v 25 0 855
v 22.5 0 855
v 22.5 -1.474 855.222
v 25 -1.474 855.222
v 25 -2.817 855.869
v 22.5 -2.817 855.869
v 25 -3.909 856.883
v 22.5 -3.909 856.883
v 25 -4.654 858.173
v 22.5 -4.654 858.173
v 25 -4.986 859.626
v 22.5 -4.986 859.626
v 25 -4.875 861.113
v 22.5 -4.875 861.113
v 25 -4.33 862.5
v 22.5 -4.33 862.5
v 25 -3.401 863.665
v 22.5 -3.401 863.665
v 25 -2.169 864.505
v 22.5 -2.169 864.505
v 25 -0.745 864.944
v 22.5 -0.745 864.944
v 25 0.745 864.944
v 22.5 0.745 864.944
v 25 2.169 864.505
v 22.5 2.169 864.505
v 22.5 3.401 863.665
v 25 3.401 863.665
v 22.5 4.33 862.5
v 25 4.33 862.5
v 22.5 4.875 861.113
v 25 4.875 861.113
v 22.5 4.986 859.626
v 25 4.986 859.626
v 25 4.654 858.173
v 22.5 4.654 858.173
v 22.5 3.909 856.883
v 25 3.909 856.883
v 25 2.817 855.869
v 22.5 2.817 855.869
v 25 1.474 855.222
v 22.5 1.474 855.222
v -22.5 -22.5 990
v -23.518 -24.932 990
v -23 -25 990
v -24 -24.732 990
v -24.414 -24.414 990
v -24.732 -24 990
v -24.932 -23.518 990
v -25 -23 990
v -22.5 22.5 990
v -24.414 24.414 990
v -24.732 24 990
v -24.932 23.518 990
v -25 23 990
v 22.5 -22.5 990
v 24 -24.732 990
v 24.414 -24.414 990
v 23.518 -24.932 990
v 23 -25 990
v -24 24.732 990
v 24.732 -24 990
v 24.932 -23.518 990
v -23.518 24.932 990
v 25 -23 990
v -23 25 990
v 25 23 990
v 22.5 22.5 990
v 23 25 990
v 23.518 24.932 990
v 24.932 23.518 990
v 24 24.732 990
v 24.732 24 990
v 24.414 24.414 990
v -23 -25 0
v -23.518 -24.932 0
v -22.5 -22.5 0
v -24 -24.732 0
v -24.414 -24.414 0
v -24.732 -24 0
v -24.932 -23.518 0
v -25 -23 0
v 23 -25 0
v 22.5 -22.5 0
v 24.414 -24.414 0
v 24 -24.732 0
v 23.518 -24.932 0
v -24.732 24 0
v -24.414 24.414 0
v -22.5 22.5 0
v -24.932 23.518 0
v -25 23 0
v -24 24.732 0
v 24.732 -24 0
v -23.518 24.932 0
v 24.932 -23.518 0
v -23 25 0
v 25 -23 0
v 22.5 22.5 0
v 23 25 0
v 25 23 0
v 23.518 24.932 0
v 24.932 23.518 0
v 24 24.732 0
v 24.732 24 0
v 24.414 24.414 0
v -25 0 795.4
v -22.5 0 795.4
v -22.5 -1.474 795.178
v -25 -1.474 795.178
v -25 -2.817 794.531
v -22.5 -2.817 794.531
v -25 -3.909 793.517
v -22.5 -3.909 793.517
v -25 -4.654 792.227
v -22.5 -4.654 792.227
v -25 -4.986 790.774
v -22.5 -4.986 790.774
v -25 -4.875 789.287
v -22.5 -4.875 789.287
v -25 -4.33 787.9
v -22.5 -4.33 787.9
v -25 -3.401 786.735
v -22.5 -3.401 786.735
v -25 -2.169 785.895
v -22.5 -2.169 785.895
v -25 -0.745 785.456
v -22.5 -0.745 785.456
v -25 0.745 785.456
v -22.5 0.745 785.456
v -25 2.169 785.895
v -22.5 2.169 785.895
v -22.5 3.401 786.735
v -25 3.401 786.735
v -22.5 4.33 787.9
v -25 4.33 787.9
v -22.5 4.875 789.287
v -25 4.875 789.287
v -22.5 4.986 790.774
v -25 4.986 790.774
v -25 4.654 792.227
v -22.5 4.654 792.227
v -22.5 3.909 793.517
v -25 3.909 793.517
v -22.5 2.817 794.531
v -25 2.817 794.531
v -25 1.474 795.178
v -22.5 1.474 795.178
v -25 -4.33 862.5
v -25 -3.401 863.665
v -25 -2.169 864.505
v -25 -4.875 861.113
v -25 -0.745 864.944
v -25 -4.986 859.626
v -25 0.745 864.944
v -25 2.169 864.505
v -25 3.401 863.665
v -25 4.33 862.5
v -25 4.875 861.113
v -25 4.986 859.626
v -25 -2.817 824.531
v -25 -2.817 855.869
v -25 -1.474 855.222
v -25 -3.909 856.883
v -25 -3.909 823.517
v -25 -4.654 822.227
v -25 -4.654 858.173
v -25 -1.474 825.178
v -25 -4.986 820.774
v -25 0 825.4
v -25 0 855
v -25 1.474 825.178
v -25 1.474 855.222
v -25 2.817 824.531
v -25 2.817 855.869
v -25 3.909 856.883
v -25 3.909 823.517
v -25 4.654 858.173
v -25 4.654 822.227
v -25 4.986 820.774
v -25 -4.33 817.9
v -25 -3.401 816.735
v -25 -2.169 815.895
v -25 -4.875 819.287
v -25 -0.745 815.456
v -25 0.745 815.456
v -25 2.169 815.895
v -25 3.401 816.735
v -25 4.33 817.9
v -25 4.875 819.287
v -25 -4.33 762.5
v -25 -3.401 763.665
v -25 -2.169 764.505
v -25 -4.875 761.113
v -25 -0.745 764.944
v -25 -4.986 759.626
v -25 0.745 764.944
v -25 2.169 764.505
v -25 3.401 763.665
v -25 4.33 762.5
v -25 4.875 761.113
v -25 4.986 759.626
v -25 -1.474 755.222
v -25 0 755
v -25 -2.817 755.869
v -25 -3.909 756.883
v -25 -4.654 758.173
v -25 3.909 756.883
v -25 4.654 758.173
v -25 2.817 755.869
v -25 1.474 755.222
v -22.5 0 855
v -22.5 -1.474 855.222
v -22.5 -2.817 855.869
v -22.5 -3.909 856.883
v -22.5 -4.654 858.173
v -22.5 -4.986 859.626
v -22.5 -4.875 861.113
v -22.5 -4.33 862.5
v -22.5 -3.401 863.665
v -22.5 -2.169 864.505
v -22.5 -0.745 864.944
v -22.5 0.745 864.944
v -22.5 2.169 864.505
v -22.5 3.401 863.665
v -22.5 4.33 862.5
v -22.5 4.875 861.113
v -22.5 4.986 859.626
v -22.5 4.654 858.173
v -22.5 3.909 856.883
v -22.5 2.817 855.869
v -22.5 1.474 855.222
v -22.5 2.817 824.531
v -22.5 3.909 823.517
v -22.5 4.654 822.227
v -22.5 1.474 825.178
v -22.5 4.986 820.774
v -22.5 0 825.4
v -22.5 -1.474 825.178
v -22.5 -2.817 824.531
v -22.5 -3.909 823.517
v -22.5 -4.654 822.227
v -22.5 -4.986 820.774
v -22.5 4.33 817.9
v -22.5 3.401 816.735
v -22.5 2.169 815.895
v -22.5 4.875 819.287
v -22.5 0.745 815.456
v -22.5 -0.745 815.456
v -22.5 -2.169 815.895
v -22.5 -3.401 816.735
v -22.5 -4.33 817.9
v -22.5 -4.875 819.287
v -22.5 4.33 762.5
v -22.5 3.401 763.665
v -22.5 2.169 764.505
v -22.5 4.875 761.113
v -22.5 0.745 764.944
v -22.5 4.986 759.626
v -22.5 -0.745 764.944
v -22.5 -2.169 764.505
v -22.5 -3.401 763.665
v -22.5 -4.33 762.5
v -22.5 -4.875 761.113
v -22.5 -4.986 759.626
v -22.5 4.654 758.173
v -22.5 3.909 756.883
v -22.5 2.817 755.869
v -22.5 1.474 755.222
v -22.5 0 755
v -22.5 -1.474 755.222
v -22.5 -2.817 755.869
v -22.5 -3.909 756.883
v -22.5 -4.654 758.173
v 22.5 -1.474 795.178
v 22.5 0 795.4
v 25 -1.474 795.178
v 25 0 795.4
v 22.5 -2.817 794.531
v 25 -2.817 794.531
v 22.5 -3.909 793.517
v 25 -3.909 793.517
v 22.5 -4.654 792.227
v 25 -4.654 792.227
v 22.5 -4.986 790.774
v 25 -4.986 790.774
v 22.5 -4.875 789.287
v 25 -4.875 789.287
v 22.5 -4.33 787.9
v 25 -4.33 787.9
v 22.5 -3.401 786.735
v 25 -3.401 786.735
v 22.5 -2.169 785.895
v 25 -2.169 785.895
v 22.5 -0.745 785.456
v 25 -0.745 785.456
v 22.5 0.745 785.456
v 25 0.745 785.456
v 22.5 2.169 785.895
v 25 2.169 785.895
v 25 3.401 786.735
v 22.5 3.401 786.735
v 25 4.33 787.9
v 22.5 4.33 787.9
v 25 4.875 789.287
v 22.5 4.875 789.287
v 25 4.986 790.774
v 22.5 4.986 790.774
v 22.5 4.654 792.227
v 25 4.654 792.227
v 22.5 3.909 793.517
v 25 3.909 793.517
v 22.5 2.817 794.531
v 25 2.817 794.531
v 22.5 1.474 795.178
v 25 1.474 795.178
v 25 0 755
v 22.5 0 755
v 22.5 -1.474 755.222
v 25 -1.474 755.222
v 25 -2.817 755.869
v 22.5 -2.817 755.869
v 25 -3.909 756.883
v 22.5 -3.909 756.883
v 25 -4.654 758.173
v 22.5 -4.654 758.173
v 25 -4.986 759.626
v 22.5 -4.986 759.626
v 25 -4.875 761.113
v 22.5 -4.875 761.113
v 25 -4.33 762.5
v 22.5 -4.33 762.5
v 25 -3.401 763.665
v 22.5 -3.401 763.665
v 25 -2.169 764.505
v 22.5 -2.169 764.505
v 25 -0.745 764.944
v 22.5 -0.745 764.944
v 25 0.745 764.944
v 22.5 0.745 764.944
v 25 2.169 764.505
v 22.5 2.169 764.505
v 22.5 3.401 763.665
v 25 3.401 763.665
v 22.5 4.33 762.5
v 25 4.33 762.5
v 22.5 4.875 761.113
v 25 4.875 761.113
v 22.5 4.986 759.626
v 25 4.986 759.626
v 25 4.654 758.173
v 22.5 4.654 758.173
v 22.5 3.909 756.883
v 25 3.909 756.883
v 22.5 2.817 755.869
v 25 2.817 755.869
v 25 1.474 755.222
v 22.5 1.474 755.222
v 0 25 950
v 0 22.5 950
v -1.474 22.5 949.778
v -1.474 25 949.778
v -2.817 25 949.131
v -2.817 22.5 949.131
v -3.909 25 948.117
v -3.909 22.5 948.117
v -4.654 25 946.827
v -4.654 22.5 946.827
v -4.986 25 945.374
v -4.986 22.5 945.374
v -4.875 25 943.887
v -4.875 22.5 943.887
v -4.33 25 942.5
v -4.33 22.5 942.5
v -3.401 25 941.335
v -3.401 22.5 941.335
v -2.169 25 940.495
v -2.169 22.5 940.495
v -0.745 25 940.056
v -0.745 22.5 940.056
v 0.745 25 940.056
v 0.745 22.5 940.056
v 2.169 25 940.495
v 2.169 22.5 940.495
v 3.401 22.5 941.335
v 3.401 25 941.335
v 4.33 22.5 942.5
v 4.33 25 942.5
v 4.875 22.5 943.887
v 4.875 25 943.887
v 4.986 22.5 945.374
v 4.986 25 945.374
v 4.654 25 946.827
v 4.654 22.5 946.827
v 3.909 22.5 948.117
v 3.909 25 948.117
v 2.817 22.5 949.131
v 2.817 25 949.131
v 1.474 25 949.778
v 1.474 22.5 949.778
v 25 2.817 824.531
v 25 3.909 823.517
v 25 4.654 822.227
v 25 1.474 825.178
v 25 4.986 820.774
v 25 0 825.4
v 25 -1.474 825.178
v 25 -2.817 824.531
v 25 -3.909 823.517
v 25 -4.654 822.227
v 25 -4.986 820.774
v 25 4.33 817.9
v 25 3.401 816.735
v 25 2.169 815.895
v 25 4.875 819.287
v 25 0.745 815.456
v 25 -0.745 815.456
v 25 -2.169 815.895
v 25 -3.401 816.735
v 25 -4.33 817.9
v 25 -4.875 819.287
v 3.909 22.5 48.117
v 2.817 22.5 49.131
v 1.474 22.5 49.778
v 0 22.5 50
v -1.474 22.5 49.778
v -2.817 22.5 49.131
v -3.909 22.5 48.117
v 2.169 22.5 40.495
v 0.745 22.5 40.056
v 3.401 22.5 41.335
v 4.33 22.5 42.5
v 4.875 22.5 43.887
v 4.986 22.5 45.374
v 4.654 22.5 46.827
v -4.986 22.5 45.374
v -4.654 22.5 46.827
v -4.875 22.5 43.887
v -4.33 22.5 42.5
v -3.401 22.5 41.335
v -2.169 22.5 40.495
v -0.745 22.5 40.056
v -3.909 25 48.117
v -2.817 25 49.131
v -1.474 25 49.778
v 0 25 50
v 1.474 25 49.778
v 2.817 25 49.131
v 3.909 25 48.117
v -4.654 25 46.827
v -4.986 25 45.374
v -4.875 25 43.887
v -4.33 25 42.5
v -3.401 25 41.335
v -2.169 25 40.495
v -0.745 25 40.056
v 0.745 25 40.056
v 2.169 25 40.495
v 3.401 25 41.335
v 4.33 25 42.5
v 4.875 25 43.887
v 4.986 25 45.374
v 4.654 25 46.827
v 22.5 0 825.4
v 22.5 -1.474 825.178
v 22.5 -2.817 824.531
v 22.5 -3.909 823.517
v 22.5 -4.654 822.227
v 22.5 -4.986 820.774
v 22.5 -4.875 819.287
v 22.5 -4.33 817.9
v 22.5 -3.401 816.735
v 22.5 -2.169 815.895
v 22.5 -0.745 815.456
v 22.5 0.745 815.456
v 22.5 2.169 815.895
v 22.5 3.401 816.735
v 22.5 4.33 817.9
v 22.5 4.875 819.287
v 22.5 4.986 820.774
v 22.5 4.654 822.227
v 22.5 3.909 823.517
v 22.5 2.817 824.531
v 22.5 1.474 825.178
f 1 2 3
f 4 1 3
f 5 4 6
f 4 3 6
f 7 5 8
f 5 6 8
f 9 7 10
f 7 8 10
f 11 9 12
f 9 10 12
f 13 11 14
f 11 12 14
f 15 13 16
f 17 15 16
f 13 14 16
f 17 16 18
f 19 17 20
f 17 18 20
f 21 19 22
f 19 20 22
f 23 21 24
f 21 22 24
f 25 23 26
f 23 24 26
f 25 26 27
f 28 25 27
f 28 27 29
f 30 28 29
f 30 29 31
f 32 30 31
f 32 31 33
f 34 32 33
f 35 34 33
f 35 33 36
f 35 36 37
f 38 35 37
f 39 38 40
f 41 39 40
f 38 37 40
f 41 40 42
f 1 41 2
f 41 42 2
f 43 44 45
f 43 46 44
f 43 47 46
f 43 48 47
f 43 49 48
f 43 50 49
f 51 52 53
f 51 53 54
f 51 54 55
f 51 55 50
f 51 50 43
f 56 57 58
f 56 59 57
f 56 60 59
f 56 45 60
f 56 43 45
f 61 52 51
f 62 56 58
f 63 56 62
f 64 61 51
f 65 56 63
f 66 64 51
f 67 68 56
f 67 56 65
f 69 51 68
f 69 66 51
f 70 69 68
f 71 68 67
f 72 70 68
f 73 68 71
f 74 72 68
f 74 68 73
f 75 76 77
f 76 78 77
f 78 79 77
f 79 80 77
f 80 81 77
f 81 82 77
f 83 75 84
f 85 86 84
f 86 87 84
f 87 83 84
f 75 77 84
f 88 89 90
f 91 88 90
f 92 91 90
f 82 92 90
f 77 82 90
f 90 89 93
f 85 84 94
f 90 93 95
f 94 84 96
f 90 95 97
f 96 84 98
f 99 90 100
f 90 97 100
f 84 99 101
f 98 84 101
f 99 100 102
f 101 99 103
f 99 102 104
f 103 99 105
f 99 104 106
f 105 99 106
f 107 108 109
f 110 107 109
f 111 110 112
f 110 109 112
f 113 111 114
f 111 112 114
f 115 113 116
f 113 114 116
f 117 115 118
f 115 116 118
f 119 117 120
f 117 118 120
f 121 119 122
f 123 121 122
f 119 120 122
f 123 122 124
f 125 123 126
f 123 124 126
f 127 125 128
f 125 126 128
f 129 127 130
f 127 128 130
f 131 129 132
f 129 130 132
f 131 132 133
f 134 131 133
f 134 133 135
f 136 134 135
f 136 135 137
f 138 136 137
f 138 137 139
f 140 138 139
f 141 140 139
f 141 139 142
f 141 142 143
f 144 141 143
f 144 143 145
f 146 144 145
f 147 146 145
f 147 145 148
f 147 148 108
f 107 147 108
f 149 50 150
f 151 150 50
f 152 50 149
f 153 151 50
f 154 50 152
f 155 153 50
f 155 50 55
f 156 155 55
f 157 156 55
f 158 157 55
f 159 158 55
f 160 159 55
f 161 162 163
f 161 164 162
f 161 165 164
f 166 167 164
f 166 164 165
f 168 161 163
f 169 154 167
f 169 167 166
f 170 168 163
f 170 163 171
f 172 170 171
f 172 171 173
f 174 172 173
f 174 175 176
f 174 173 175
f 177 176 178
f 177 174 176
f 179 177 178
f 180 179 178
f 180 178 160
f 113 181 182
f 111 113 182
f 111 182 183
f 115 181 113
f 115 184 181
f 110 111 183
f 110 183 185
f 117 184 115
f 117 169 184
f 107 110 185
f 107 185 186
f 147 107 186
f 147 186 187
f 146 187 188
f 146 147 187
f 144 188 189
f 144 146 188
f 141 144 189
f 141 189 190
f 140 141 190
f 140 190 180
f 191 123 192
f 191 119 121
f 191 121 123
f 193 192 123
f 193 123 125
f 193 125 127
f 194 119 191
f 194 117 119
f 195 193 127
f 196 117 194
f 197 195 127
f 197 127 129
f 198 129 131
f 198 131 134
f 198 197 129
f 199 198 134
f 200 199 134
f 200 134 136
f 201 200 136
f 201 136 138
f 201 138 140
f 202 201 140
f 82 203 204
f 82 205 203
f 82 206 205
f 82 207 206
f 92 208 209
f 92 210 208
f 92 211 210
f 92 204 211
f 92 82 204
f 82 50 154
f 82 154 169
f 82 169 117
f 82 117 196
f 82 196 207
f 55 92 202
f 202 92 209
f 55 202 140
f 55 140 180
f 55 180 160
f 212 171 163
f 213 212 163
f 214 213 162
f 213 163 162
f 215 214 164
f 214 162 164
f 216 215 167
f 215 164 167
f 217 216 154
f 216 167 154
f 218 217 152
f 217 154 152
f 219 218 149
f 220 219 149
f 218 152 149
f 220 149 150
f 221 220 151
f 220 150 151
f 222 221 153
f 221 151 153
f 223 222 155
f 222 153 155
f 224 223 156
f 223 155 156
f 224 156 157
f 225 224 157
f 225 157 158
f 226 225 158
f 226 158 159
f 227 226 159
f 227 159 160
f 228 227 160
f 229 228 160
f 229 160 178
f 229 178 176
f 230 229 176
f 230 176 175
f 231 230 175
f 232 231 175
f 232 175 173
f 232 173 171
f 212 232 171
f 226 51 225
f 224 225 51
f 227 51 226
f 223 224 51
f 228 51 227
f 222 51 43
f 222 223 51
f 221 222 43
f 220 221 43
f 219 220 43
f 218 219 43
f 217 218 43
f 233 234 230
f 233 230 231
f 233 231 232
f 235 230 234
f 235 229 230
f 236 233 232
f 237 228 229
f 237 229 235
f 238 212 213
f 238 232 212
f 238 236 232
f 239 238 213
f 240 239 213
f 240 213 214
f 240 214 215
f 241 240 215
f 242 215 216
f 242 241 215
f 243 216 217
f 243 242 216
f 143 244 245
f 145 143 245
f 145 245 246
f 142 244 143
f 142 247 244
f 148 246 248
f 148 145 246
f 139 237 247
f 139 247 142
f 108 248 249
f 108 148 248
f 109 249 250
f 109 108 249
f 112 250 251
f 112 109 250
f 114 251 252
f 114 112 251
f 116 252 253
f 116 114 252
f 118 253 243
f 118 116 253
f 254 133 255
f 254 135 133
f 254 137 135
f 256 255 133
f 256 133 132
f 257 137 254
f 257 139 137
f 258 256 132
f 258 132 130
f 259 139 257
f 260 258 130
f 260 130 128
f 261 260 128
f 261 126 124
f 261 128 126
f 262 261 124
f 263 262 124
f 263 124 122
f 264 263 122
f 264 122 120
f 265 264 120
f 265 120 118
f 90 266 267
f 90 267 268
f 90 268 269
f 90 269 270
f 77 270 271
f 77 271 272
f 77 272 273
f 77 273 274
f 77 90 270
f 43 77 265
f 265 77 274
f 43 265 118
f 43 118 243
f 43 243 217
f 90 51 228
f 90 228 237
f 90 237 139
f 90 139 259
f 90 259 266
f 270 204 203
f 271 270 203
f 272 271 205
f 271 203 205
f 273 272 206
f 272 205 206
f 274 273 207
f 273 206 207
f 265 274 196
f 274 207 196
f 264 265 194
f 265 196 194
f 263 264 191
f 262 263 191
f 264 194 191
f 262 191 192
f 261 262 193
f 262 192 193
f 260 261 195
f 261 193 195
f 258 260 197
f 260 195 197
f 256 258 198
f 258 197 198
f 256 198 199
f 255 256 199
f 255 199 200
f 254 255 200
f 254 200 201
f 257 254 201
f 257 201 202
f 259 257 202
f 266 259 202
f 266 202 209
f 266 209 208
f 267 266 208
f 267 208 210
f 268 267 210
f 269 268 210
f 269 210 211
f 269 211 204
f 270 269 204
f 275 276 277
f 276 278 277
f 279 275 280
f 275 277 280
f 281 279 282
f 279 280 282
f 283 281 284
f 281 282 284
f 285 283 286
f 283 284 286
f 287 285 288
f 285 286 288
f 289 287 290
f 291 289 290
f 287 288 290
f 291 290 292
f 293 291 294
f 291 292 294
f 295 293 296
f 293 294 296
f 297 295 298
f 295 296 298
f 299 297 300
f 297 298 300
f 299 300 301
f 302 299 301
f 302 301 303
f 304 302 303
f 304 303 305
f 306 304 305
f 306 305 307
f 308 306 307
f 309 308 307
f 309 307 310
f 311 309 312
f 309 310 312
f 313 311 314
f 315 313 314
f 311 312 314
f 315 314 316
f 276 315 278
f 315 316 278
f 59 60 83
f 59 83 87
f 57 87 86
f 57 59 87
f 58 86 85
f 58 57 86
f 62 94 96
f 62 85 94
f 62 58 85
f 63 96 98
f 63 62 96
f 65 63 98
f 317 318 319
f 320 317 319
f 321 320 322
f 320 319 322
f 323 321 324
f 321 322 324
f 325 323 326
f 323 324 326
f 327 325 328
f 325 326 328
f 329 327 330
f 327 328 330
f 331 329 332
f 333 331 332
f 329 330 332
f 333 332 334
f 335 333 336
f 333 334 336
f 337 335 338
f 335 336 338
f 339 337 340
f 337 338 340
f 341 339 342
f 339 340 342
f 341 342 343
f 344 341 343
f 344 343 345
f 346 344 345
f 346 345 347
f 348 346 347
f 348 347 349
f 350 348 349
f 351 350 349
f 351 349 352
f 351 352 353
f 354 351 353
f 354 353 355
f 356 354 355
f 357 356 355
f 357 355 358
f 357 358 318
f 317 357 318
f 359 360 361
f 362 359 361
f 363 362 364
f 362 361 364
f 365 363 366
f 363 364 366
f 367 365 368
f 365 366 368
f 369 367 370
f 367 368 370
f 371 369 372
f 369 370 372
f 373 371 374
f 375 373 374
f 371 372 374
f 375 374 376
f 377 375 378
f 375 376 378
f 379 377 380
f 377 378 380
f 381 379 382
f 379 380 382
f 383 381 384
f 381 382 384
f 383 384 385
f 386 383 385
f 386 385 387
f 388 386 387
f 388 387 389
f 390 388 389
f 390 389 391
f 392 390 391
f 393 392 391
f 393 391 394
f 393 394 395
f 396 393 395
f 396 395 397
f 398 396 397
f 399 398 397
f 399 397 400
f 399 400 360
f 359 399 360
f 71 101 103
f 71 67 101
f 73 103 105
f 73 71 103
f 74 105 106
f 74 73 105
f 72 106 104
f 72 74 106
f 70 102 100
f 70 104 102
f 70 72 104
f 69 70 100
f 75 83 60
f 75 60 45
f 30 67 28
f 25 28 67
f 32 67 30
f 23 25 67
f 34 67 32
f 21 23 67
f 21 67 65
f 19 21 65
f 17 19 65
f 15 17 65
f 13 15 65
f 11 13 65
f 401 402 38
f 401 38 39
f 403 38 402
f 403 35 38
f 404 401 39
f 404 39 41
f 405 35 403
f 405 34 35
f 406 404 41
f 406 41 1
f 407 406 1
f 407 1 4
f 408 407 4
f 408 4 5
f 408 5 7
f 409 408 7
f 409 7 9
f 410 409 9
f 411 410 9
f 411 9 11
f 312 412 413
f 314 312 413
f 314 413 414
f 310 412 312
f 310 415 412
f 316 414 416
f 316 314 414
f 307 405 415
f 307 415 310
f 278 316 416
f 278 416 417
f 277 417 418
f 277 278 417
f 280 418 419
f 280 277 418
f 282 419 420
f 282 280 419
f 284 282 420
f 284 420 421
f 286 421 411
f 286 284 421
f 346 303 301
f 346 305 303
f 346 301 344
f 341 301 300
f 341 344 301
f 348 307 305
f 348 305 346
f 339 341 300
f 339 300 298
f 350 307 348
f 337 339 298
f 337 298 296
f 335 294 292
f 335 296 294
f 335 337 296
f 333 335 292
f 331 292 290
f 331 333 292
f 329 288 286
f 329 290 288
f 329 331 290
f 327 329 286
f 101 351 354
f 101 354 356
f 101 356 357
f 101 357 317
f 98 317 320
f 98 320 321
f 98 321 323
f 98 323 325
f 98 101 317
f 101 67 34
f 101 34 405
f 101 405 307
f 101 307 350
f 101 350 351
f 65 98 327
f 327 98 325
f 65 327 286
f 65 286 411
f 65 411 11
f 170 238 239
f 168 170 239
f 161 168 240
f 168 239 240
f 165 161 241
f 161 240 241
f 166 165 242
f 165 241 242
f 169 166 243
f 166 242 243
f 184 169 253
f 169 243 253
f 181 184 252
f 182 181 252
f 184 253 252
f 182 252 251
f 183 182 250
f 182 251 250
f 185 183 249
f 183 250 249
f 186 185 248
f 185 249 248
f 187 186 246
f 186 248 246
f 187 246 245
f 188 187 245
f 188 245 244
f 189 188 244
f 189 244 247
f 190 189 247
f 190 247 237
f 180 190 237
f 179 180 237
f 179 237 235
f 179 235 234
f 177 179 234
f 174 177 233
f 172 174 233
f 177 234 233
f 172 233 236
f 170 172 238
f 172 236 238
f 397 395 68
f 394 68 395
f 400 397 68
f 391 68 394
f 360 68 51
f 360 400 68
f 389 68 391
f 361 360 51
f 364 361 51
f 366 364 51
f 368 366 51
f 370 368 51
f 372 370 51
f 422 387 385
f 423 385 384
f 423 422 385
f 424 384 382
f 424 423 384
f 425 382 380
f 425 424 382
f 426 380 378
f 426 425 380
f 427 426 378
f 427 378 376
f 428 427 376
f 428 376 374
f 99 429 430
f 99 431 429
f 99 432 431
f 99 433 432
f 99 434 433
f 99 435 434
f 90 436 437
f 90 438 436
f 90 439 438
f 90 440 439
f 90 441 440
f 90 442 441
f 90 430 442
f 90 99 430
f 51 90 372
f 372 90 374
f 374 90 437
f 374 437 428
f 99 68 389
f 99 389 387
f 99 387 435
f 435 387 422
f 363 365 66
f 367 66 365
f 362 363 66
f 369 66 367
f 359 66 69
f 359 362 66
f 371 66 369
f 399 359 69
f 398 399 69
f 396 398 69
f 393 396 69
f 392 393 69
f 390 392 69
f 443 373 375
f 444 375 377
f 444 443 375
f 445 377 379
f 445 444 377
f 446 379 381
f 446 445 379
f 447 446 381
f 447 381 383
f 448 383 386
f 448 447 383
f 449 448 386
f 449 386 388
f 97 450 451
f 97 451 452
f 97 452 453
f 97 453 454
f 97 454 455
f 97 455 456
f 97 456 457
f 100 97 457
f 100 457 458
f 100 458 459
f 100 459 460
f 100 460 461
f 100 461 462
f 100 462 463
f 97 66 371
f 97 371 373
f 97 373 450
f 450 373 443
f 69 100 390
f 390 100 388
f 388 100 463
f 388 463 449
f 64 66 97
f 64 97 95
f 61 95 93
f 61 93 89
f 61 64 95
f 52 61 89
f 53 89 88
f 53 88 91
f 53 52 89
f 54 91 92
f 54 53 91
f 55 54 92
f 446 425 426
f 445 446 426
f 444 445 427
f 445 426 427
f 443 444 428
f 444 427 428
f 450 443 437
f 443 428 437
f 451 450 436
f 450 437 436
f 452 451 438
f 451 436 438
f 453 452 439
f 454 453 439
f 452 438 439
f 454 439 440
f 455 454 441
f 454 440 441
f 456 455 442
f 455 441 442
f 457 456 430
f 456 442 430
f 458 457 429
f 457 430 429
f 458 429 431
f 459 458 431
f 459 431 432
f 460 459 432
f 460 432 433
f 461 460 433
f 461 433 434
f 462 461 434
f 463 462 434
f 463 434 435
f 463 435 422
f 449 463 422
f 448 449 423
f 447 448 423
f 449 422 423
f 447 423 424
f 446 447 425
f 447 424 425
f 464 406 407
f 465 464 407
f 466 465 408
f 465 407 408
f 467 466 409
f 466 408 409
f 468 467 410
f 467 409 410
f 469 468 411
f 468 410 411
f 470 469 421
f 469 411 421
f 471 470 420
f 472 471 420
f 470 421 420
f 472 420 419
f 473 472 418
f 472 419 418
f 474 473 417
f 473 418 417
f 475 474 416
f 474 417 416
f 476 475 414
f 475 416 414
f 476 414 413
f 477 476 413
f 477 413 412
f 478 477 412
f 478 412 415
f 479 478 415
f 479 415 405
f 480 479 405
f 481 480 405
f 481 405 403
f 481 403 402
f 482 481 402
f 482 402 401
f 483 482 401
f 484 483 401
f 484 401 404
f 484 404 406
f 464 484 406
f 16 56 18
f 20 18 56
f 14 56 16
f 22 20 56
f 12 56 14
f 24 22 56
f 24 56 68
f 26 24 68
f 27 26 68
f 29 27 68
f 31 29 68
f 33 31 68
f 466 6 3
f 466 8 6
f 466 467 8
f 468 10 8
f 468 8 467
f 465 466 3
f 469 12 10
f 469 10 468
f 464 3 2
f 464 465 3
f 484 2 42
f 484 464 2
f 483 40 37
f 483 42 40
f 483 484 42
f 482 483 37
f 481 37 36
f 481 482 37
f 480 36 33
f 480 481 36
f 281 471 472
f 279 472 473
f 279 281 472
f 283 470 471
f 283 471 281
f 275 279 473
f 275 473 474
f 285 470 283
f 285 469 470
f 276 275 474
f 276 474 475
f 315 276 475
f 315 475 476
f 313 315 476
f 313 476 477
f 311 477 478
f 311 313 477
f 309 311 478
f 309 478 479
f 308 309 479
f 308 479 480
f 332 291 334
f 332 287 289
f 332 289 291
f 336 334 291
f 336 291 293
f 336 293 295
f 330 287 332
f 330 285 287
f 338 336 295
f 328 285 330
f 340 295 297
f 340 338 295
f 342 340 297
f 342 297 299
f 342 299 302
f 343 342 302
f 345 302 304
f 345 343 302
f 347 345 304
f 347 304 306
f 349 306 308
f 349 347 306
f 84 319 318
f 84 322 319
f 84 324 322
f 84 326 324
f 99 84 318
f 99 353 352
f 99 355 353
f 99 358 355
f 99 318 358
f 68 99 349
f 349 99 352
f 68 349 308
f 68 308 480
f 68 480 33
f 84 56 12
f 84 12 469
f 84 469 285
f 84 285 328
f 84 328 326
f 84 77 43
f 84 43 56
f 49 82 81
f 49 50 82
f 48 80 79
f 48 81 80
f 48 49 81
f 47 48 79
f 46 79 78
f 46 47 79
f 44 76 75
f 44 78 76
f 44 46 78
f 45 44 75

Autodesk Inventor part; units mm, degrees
ref_plane "YZ Plane" through (0, 0, 0) normal (1, 0, 0) x (0, 1, 0)
ref_plane "XZ Plane" through (0, 0, 0) normal (0, 1, 0) x (-1, 0, 0)
ref_plane "XY Plane" through (0, 0, 0) normal (0, 0, 1) x (1, 0, 0)
sketch "Sketch1" plane through (0, 0, 0) normal (0, 0, 1) x (1, 0, 0)
  line L0 (-25, 25) -> (25, 25)
  line L1 (25, 25) -> (25, -25)
  line L2 (25, -25) -> (-25, -25)
  line L3 (-25, -25) -> (-25, 25)
  line L4 (22.5, 22.5) -> (-22.5, 22.5)
  line L5 (-22.5, 22.5) -> (-22.5, -22.5)
  line L6 (-22.5, -22.5) -> (22.5, -22.5)
  line L7 (22.5, -22.5) -> (22.5, 22.5)
  point P0 (0, 0)
  dimension "d0" = 50
  dimension "d1" = 50
  dimension "d2" = 25
  dimension "d3" = 25
  dimension "d4" = 2.5
extrude "Extrusion1" add sketch "Sketch1" along normal blind 990
fillet "Fillet1" radius 2 4 edges at (25, 25, 495) (-25, 25, 495) (25, -25, 495) (-25, -25, 495)
sketch "Sketch2" plane through (-23, 25, 0) normal (0, 1, 0) x (1, 0, 0)
  line L0 (46, 0) -> (0, 0) projected
  line L1 (46, -990) -> (0, -990) projected
  point P0 (23, 0)
  point P1 (23, -45)
  point P2 (23, -945)
  dimension "d8" = 45
  dimension "d9" = 0
  dimension "d10" = 45
  dimension "d11" = 0
hole "endHoles" at (0, 25, 45) at (0, 25, 945) direction (0, -1, 0) diameter 10 depth 2.5
sketch "Sketch3" plane through (25, -23, 0) normal (1, 0, 0) x (0, 0, -1)
  point P0 (0, 23)
  point P1 (-860, 23)
  point P2 (-760, 23)
  dimension "d19" = 860
  dimension "d20" = 760
  dimension "d21" = 0
  dimension "d22" = 0
hole "clampHoles" at (25, 0, 860) at (25, 0, 760) direction (-1, 0, 0) diameter 10 end through all
sketch "Sketch4" plane through (-25, -23, 0) normal (-1, 0, 0) x (0, 0, 1)
  circle A0 centre (760, 23) radius 5 projected
  circle A1 centre (760, 23) radius 5 projected
  circle A2 centre (860, 23) radius 5 projected
  line L0 (760, 23) -> (860, 23)
  point P0 (0, 23)
  point P1 (790.4, 23)
  point P2 (820.4, 23)
  dimension "d30" = 30
  dimension "d32" = 39.6
hole "Hole3" at (-25, 0, 790.4) at (-25, 0, 820.4) direction (1, 0, 0) diameter 10 end through all
equation "\"d0\" = w"
equation "\"d1\" = w"
equation "\"d2\" = 0.5 * d1"
equation "\"d3\" = 0.5 * d0"
equation "\"d4\" = 0.5 * t"
equation "\"d5\" = L + 2 * buffer"
equation "\"d7\" = fillet"
equation "\"d8\" = buffer"
equation "\"d10\" = buffer"
equation "\"d23\" = support_frame_clampHoleDiameter"
equation "\"w\" = support_frame_squareBarDimension"
equation "\"t\" = support_frame_squareBarThickness"
equation "\"fillet\" = support_frame_squareBarFillet"
equation "\"support_frame_endHoleBuffer\" = 45"
equation "\"buffer\" = support_frame_endHoleBuffer"
equation "\"hoop_angle_z\" = 45deg"
equation "\"hoop_bearing_length\" = 5deg"
equation "\"hoop_cable_diam\" = 5"
equation "\"hoop_cable_pulley_diam\" = 22"
equation "\"hoop_thickness_large\" = 4"
equation "\"hoop_thickness_medium\" = 3.2"
equation "\"hoop_thickness_small\" = 2"
equation "\"hoop_width_large\" = 51"
equation "\"hoop_width_medium\" = 33.7"
equation "\"hoop_width_small\" = 25.4"
equation "\"rack_tooth_addendum\" = 5"
equation "\"rack_tooth_dedendum\" = 5"
equation "\"rack_tooth_thickness\" = 5"
equation "\"secure_arm_angle\" = 35deg"
equation "\"secure_arm_radii\" = 9"
equation "\"support_baseClamp_platformLengthBuffer\" = 35"
equation "\"support_baseClamp_platformThickness\" = 15"
equation "\"support_baseClamp_platformWidthBuffer\" = 0"
equation "\"support_baseClamp_sleeveHoleDiameter\" = 12"
equation "\"support_baseClamp_sleeveSweepTerminationAngle\" = 55deg"
equation "\"support_baseClamp_thickness\" = 8"
equation "\"support_frame_clampHoleDiameter\" = 10"
equation "\"support_frame_squareBarFillet\" = 2"
equation "\"support_frame_squareBarThickness\" = 5"
equation "\"hoop_tabs_thickness\" = 6"
equation "\"wheelchair_deployed_length\" = 1067"
equation "\"wheelchair_deployed_height\" = 914"
equation "\"hoop_tabs_hole\" = 12"
equation "\"wheelchair_deployed_width\" = 635"
equation "\"sm_varx_pinPlate_thickness\" = 5"
equation "\"sm_varx_member_tolerance\" = 0"
equation "\"sm_varx_pinPlate_holeDiameter\" = 5"
equation "\"sm_varx_squareBarThickness\" = 2.5"
equation "\"hoop_bushing23_radialInterference\" = 0"
equation "\"hoop_bushing12_radialInterference\" = 0"
equation "\"hoop_bushing12_od\" = -2 * hoop_thickness_large + hoop_width_large + hoop_bushing12_radialInterference"
equation "\"wheelchatir_pos_deploy_angle_0\" = 65deg"
equation "\"wheelchatir_pos_store_angle_0\" = 90deg"
equation "\"wheelchatir_pos_deploy_angle_1\" = 20deg"
equation "\"wheelchatir_pos_store_angle_1\" = 20deg"
equation "\"hoop_bushing23_od\" = -2 * hoop_thickness_medium + hoop_width_medium + hoop_bushing23_radialInterference"
equation "\"hoop_bushing12_thickness\" = -hoop_width_medium + hoop_bushing12_od - 2 * hoop_bushing12_radialInterference"
equation "\"hoop_bushing23_thickness\" = -hoop_width_small + hoop_bushing23_od - 2 * hoop_bushing23_radialInterference"
equation "\"L\" = 900"
equation "\"support_frame_squareBarDimension\" = 50"
properties part number "support_frame_x" material "Steel, Mild"
